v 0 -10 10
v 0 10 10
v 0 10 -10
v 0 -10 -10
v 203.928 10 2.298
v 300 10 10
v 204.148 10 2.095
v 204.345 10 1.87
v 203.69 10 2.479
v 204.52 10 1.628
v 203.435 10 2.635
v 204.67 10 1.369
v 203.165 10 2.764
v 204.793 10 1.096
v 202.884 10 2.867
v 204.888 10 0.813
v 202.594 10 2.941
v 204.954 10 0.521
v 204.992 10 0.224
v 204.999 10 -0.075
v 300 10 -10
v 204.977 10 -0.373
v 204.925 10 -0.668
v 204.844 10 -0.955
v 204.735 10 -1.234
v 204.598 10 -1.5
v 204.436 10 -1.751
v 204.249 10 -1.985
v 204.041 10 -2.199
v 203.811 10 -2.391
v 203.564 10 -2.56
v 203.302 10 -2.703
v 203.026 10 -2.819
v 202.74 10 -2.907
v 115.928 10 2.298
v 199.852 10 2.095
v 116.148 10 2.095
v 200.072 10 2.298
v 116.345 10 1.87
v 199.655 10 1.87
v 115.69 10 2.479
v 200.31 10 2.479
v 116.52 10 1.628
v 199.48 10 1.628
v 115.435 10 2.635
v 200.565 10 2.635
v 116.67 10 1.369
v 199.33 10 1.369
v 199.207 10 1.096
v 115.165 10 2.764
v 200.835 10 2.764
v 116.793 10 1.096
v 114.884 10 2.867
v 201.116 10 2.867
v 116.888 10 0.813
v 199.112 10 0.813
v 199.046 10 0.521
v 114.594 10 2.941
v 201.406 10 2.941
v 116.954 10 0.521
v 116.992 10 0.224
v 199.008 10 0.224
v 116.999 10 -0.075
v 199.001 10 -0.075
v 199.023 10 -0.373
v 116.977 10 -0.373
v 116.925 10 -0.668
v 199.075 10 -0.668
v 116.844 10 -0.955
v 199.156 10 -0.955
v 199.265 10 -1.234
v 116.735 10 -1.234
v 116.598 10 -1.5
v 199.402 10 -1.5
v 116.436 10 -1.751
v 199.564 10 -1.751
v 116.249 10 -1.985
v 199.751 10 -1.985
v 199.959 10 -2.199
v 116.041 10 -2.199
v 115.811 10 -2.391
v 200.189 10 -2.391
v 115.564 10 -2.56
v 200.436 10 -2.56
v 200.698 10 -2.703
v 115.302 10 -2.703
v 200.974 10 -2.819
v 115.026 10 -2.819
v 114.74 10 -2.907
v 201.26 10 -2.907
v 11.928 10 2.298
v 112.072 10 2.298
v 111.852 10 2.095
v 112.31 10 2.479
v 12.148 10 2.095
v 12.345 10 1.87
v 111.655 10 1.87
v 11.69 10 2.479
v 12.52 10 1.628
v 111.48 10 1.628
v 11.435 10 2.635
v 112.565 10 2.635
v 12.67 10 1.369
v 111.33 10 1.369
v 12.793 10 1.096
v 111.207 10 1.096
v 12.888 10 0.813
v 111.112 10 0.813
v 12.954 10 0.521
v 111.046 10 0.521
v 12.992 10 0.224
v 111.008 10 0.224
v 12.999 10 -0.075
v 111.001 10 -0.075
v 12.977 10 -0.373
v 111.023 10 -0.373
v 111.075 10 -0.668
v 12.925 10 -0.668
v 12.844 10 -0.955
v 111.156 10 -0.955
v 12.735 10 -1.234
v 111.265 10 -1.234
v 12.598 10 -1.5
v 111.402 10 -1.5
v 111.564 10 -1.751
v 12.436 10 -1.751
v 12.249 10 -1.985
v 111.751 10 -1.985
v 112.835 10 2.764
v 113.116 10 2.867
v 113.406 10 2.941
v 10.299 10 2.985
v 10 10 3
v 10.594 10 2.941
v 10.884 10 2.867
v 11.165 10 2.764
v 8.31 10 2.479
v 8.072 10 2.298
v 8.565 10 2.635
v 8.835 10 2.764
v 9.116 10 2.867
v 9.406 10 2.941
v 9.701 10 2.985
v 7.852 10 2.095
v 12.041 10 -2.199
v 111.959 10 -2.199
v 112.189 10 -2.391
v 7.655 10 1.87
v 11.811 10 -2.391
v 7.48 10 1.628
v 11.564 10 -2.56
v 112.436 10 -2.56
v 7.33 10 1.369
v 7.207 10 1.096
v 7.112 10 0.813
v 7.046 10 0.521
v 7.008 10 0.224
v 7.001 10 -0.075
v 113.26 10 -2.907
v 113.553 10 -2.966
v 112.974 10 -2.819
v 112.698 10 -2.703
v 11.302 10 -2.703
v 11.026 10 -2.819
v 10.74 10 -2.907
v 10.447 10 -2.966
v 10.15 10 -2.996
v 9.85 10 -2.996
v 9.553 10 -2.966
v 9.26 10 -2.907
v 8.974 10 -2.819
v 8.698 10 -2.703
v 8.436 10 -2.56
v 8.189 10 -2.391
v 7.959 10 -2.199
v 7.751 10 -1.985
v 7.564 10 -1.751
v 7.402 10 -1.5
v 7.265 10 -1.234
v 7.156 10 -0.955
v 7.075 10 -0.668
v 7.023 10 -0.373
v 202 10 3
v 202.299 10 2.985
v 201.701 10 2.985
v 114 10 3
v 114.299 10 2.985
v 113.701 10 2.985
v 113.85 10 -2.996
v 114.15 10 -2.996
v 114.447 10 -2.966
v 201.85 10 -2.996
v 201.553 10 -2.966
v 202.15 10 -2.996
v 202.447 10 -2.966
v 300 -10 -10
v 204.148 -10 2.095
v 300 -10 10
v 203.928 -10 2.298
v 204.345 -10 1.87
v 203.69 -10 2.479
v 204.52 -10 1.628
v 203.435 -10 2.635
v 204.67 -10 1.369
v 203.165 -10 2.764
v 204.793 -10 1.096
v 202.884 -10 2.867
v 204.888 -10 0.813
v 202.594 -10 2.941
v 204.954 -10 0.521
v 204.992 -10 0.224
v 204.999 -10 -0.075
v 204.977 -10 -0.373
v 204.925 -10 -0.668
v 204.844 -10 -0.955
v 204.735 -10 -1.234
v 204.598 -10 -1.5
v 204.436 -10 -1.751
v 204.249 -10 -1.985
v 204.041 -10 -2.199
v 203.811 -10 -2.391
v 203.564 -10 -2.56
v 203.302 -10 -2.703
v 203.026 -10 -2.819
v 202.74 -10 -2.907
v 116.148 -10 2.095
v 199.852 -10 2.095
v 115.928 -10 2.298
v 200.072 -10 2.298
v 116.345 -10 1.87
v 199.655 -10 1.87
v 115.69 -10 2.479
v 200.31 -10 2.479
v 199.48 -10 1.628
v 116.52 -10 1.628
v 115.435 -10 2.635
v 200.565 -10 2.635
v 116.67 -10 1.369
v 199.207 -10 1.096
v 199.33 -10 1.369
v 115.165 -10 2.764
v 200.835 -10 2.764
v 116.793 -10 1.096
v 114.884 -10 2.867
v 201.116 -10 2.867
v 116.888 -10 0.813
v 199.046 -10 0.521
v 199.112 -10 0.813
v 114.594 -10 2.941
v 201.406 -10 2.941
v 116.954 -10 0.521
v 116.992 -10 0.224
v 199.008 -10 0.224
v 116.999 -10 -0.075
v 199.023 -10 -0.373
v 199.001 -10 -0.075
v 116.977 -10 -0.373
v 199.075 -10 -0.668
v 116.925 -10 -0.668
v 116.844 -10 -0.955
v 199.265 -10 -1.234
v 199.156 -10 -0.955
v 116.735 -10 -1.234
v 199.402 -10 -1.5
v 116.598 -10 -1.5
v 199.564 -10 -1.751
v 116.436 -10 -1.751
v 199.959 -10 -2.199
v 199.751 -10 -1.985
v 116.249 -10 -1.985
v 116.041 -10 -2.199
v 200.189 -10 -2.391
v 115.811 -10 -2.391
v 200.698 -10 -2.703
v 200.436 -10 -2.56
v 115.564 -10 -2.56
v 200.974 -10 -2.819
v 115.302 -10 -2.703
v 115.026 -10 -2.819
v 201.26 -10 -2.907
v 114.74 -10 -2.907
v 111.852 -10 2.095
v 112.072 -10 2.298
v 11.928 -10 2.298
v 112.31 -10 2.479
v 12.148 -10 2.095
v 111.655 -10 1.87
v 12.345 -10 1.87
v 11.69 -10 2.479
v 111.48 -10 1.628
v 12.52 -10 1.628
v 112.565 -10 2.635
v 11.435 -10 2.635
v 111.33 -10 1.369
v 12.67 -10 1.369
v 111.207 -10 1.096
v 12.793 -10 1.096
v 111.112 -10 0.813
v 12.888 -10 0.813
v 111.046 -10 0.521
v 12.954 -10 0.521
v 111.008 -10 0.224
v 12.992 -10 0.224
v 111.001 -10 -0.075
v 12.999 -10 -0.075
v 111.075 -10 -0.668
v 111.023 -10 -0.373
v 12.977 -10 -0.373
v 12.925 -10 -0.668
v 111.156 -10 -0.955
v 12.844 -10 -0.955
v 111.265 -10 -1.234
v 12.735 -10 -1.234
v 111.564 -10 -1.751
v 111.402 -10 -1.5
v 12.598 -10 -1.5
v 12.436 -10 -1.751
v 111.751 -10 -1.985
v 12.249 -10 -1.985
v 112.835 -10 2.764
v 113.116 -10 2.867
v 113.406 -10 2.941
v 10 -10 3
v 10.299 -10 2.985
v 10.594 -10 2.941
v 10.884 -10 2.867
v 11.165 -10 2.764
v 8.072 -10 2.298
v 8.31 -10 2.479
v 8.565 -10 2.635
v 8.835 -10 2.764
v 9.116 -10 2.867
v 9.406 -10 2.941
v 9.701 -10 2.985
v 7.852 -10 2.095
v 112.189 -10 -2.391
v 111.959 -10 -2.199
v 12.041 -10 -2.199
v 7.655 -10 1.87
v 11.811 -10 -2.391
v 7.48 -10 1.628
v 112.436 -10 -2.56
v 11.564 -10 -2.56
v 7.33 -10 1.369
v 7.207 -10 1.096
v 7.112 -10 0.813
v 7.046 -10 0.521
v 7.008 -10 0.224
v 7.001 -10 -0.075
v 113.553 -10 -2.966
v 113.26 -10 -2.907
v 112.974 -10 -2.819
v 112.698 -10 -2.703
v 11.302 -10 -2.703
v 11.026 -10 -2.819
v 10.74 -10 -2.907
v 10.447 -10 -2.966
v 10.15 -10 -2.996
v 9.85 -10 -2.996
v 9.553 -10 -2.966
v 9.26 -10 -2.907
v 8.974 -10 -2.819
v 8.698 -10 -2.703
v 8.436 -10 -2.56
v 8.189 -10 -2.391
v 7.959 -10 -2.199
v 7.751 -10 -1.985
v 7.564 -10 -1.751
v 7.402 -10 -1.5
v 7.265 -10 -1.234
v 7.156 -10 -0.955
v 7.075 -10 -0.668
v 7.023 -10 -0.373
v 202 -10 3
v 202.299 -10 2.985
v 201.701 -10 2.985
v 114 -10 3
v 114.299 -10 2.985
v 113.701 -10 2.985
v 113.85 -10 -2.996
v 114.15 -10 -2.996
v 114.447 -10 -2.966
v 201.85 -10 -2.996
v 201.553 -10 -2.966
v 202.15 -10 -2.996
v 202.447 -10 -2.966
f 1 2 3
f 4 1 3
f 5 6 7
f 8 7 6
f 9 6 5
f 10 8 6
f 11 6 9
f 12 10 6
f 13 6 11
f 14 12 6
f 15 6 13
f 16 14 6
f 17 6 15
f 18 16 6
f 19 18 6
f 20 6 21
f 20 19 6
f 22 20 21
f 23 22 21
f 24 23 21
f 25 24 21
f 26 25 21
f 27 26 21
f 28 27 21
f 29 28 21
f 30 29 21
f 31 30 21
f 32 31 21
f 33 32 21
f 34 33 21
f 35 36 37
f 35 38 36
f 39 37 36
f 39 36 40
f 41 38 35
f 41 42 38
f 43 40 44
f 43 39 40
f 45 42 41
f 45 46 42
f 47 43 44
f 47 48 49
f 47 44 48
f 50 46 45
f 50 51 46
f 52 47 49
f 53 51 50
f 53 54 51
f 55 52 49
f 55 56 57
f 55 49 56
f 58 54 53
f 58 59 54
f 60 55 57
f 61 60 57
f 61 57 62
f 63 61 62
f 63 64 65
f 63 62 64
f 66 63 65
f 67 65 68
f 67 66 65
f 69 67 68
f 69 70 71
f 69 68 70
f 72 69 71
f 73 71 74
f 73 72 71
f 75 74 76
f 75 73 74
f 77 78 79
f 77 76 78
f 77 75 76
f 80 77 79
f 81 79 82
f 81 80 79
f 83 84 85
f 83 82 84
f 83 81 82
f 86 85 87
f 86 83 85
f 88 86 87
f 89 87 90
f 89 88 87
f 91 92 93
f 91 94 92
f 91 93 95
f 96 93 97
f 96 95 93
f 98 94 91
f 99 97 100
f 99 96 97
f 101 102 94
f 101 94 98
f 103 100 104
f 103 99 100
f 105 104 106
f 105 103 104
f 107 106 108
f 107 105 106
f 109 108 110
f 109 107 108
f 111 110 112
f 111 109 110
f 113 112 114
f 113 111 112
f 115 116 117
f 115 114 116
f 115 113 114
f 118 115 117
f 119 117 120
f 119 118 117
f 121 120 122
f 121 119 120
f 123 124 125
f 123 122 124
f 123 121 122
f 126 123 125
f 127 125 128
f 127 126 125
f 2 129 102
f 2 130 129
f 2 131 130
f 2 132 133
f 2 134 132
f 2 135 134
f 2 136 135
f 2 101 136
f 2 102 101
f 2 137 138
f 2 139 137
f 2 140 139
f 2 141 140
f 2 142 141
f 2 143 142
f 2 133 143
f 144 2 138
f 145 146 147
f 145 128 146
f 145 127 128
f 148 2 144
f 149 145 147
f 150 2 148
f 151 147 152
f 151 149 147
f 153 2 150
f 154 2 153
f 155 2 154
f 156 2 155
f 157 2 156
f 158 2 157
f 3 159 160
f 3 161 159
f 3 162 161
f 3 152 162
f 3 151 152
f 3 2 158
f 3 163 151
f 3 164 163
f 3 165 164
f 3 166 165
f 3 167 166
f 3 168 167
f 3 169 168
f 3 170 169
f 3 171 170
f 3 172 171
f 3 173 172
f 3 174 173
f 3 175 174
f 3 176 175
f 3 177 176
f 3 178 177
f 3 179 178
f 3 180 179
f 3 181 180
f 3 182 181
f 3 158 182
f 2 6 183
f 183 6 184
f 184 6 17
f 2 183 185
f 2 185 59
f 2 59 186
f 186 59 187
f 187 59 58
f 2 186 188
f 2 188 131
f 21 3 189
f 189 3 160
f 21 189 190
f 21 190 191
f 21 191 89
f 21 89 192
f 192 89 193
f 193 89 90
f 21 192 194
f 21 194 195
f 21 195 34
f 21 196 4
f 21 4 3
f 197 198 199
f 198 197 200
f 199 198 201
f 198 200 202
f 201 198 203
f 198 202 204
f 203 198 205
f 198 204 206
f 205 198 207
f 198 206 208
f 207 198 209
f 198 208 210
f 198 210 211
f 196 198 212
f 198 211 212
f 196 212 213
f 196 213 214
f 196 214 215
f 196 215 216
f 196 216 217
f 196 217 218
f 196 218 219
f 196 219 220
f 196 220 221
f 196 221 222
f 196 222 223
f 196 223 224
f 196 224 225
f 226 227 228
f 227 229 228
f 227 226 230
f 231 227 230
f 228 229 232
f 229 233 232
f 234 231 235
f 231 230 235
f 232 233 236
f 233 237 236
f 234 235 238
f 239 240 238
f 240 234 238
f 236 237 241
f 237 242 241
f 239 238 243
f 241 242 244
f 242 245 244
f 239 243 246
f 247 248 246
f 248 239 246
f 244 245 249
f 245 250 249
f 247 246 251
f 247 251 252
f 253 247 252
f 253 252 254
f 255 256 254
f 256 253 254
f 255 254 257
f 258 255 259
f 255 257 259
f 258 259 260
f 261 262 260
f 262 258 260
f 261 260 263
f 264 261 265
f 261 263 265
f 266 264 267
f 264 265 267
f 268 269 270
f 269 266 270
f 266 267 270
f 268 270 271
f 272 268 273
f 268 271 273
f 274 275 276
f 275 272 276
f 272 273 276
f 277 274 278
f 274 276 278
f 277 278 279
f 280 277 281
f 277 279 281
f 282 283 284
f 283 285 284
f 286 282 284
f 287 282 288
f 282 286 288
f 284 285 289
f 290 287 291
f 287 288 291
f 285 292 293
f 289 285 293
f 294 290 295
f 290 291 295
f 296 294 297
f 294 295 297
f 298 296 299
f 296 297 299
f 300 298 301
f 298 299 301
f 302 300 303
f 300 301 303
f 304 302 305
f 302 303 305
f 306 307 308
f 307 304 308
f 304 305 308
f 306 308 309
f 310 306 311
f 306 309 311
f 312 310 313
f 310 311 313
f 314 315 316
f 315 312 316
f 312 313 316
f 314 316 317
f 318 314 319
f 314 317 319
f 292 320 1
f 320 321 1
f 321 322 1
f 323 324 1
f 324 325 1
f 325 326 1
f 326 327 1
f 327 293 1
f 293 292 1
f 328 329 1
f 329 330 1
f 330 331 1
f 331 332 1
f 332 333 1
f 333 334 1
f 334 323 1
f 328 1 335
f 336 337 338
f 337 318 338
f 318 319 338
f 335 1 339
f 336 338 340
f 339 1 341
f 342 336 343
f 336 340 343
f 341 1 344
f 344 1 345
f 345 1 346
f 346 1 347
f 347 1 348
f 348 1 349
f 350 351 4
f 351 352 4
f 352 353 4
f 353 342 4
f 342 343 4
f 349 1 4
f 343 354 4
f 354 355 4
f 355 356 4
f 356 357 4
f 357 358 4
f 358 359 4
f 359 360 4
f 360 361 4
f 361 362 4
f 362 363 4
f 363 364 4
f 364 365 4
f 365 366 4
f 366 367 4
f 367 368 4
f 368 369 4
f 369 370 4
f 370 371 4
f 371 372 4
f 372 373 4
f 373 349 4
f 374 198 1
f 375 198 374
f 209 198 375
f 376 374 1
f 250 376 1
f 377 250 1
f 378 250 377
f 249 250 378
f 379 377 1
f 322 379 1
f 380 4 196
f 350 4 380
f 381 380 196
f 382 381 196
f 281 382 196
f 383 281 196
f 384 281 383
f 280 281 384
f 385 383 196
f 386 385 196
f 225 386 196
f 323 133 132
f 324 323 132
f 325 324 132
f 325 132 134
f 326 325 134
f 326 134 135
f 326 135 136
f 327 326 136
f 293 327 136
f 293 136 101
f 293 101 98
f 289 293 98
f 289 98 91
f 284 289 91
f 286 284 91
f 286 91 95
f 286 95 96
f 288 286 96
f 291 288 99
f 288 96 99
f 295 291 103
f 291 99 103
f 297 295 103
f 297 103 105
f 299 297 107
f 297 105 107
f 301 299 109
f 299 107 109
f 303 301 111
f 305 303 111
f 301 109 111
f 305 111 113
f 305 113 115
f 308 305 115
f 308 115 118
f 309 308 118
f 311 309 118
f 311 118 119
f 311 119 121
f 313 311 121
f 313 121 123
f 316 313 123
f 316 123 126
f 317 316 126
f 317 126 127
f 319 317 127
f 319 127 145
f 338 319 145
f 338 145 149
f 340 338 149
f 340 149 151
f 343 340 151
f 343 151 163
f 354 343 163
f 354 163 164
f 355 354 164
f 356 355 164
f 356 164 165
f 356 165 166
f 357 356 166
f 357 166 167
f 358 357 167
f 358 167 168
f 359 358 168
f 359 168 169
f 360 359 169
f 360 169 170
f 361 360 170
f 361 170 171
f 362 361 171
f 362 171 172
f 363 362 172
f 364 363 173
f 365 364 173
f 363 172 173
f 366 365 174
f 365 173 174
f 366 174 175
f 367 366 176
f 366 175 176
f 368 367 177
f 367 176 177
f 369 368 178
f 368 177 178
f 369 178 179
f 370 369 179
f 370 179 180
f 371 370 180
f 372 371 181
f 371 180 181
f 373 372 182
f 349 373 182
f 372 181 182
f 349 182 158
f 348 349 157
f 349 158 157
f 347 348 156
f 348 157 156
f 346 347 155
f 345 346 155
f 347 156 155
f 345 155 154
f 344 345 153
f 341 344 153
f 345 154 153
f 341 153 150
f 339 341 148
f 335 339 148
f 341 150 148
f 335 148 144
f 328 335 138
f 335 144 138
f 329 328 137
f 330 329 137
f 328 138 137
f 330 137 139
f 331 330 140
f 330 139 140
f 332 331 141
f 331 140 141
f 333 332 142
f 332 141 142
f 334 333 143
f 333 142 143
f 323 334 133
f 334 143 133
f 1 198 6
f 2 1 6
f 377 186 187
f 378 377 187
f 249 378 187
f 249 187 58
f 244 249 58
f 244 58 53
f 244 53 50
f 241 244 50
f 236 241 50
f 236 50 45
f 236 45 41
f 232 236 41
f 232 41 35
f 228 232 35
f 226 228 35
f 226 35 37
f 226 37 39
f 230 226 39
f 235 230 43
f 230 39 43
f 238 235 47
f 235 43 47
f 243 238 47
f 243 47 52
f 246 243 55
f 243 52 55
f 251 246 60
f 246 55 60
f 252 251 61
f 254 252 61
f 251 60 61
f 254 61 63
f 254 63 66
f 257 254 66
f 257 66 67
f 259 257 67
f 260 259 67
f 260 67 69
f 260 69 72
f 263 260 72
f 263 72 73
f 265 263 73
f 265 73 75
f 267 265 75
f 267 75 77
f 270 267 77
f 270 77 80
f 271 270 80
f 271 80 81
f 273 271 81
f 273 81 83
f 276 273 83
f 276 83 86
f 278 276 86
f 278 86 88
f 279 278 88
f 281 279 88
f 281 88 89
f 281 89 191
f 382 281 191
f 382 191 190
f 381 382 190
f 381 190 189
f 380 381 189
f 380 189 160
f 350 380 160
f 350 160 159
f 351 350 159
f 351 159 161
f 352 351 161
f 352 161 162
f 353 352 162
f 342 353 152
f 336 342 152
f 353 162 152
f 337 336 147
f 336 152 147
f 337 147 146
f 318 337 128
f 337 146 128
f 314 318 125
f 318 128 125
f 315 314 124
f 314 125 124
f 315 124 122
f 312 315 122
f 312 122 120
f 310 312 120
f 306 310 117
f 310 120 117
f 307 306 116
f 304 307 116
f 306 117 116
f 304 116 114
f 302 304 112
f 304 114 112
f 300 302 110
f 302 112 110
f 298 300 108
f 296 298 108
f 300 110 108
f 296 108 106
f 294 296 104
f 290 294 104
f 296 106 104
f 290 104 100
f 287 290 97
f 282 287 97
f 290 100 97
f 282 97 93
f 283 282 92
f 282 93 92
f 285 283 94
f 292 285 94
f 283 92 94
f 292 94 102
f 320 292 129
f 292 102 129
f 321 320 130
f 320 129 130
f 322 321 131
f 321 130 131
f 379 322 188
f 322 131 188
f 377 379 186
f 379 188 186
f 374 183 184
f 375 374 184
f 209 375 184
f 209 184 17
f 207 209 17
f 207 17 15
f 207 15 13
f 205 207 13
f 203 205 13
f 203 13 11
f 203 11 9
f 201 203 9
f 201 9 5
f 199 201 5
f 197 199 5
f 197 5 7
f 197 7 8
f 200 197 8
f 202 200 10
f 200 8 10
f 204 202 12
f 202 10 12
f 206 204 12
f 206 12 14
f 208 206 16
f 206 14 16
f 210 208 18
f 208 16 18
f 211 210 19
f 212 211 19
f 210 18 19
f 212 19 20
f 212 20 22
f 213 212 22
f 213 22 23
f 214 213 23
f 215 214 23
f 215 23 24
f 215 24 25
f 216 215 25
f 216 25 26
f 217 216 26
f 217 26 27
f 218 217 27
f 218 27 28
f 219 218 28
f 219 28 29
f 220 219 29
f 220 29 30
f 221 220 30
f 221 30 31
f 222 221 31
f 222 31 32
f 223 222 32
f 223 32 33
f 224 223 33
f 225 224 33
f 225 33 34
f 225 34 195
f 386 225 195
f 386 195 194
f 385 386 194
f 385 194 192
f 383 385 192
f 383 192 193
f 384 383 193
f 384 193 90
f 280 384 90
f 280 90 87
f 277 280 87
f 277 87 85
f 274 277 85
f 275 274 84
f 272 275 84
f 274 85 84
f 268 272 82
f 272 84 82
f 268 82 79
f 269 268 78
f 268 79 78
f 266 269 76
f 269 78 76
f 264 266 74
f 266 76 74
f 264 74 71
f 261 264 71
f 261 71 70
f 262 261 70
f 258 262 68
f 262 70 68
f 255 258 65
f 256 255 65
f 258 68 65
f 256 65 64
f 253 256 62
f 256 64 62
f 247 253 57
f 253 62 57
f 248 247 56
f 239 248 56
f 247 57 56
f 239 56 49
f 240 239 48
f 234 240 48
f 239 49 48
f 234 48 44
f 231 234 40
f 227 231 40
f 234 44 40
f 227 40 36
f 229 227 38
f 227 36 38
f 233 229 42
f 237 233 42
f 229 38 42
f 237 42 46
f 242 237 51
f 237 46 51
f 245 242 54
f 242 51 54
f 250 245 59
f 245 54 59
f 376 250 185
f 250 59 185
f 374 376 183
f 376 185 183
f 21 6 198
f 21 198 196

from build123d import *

# Parameters (mm, degrees)
SKIZZE1_W                       = 20
SKIZZE1_H                       = 20
AUFSATZ_LINEAR_AUSTRAGEN1_DEPTH = 300
SKIZZE2_R                       = 3
SCHNITT_LINEAR_AUSTRAGEN1_DEPTH = 301.83217913


with BuildPart() as part:
    # Skizze1 → Aufsatz-Linear austragen1 (new body)
    with BuildSketch(Plane(origin=(0, 0, 0), x_dir=(0, 0, -1), z_dir=(1, 0, 0))):
        Rectangle(SKIZZE1_W, SKIZZE1_H)
    extrude(amount=AUFSATZ_LINEAR_AUSTRAGEN1_DEPTH)

    # Skizze2 → Schnitt-Linear austragen1 (cut, through all)
    with BuildSketch(Plane(origin=(0, 10, 0), x_dir=(1, 0, 0), z_dir=(0, 1, 0))):
        with Locations(Location((10, 0, 0), (0, 0, 270))):
            Circle(SKIZZE2_R)
        with Locations(Location((114, 0, 0), (0, 0, 270))):
            Circle(SKIZZE2_R)
        with Locations(Location((202, 0, 0), (0, 0, 270))):
            Circle(SKIZZE2_R)
    extrude(amount=-SCHNITT_LINEAR_AUSTRAGEN1_DEPTH, mode=Mode.SUBTRACT)


solid = part.part
